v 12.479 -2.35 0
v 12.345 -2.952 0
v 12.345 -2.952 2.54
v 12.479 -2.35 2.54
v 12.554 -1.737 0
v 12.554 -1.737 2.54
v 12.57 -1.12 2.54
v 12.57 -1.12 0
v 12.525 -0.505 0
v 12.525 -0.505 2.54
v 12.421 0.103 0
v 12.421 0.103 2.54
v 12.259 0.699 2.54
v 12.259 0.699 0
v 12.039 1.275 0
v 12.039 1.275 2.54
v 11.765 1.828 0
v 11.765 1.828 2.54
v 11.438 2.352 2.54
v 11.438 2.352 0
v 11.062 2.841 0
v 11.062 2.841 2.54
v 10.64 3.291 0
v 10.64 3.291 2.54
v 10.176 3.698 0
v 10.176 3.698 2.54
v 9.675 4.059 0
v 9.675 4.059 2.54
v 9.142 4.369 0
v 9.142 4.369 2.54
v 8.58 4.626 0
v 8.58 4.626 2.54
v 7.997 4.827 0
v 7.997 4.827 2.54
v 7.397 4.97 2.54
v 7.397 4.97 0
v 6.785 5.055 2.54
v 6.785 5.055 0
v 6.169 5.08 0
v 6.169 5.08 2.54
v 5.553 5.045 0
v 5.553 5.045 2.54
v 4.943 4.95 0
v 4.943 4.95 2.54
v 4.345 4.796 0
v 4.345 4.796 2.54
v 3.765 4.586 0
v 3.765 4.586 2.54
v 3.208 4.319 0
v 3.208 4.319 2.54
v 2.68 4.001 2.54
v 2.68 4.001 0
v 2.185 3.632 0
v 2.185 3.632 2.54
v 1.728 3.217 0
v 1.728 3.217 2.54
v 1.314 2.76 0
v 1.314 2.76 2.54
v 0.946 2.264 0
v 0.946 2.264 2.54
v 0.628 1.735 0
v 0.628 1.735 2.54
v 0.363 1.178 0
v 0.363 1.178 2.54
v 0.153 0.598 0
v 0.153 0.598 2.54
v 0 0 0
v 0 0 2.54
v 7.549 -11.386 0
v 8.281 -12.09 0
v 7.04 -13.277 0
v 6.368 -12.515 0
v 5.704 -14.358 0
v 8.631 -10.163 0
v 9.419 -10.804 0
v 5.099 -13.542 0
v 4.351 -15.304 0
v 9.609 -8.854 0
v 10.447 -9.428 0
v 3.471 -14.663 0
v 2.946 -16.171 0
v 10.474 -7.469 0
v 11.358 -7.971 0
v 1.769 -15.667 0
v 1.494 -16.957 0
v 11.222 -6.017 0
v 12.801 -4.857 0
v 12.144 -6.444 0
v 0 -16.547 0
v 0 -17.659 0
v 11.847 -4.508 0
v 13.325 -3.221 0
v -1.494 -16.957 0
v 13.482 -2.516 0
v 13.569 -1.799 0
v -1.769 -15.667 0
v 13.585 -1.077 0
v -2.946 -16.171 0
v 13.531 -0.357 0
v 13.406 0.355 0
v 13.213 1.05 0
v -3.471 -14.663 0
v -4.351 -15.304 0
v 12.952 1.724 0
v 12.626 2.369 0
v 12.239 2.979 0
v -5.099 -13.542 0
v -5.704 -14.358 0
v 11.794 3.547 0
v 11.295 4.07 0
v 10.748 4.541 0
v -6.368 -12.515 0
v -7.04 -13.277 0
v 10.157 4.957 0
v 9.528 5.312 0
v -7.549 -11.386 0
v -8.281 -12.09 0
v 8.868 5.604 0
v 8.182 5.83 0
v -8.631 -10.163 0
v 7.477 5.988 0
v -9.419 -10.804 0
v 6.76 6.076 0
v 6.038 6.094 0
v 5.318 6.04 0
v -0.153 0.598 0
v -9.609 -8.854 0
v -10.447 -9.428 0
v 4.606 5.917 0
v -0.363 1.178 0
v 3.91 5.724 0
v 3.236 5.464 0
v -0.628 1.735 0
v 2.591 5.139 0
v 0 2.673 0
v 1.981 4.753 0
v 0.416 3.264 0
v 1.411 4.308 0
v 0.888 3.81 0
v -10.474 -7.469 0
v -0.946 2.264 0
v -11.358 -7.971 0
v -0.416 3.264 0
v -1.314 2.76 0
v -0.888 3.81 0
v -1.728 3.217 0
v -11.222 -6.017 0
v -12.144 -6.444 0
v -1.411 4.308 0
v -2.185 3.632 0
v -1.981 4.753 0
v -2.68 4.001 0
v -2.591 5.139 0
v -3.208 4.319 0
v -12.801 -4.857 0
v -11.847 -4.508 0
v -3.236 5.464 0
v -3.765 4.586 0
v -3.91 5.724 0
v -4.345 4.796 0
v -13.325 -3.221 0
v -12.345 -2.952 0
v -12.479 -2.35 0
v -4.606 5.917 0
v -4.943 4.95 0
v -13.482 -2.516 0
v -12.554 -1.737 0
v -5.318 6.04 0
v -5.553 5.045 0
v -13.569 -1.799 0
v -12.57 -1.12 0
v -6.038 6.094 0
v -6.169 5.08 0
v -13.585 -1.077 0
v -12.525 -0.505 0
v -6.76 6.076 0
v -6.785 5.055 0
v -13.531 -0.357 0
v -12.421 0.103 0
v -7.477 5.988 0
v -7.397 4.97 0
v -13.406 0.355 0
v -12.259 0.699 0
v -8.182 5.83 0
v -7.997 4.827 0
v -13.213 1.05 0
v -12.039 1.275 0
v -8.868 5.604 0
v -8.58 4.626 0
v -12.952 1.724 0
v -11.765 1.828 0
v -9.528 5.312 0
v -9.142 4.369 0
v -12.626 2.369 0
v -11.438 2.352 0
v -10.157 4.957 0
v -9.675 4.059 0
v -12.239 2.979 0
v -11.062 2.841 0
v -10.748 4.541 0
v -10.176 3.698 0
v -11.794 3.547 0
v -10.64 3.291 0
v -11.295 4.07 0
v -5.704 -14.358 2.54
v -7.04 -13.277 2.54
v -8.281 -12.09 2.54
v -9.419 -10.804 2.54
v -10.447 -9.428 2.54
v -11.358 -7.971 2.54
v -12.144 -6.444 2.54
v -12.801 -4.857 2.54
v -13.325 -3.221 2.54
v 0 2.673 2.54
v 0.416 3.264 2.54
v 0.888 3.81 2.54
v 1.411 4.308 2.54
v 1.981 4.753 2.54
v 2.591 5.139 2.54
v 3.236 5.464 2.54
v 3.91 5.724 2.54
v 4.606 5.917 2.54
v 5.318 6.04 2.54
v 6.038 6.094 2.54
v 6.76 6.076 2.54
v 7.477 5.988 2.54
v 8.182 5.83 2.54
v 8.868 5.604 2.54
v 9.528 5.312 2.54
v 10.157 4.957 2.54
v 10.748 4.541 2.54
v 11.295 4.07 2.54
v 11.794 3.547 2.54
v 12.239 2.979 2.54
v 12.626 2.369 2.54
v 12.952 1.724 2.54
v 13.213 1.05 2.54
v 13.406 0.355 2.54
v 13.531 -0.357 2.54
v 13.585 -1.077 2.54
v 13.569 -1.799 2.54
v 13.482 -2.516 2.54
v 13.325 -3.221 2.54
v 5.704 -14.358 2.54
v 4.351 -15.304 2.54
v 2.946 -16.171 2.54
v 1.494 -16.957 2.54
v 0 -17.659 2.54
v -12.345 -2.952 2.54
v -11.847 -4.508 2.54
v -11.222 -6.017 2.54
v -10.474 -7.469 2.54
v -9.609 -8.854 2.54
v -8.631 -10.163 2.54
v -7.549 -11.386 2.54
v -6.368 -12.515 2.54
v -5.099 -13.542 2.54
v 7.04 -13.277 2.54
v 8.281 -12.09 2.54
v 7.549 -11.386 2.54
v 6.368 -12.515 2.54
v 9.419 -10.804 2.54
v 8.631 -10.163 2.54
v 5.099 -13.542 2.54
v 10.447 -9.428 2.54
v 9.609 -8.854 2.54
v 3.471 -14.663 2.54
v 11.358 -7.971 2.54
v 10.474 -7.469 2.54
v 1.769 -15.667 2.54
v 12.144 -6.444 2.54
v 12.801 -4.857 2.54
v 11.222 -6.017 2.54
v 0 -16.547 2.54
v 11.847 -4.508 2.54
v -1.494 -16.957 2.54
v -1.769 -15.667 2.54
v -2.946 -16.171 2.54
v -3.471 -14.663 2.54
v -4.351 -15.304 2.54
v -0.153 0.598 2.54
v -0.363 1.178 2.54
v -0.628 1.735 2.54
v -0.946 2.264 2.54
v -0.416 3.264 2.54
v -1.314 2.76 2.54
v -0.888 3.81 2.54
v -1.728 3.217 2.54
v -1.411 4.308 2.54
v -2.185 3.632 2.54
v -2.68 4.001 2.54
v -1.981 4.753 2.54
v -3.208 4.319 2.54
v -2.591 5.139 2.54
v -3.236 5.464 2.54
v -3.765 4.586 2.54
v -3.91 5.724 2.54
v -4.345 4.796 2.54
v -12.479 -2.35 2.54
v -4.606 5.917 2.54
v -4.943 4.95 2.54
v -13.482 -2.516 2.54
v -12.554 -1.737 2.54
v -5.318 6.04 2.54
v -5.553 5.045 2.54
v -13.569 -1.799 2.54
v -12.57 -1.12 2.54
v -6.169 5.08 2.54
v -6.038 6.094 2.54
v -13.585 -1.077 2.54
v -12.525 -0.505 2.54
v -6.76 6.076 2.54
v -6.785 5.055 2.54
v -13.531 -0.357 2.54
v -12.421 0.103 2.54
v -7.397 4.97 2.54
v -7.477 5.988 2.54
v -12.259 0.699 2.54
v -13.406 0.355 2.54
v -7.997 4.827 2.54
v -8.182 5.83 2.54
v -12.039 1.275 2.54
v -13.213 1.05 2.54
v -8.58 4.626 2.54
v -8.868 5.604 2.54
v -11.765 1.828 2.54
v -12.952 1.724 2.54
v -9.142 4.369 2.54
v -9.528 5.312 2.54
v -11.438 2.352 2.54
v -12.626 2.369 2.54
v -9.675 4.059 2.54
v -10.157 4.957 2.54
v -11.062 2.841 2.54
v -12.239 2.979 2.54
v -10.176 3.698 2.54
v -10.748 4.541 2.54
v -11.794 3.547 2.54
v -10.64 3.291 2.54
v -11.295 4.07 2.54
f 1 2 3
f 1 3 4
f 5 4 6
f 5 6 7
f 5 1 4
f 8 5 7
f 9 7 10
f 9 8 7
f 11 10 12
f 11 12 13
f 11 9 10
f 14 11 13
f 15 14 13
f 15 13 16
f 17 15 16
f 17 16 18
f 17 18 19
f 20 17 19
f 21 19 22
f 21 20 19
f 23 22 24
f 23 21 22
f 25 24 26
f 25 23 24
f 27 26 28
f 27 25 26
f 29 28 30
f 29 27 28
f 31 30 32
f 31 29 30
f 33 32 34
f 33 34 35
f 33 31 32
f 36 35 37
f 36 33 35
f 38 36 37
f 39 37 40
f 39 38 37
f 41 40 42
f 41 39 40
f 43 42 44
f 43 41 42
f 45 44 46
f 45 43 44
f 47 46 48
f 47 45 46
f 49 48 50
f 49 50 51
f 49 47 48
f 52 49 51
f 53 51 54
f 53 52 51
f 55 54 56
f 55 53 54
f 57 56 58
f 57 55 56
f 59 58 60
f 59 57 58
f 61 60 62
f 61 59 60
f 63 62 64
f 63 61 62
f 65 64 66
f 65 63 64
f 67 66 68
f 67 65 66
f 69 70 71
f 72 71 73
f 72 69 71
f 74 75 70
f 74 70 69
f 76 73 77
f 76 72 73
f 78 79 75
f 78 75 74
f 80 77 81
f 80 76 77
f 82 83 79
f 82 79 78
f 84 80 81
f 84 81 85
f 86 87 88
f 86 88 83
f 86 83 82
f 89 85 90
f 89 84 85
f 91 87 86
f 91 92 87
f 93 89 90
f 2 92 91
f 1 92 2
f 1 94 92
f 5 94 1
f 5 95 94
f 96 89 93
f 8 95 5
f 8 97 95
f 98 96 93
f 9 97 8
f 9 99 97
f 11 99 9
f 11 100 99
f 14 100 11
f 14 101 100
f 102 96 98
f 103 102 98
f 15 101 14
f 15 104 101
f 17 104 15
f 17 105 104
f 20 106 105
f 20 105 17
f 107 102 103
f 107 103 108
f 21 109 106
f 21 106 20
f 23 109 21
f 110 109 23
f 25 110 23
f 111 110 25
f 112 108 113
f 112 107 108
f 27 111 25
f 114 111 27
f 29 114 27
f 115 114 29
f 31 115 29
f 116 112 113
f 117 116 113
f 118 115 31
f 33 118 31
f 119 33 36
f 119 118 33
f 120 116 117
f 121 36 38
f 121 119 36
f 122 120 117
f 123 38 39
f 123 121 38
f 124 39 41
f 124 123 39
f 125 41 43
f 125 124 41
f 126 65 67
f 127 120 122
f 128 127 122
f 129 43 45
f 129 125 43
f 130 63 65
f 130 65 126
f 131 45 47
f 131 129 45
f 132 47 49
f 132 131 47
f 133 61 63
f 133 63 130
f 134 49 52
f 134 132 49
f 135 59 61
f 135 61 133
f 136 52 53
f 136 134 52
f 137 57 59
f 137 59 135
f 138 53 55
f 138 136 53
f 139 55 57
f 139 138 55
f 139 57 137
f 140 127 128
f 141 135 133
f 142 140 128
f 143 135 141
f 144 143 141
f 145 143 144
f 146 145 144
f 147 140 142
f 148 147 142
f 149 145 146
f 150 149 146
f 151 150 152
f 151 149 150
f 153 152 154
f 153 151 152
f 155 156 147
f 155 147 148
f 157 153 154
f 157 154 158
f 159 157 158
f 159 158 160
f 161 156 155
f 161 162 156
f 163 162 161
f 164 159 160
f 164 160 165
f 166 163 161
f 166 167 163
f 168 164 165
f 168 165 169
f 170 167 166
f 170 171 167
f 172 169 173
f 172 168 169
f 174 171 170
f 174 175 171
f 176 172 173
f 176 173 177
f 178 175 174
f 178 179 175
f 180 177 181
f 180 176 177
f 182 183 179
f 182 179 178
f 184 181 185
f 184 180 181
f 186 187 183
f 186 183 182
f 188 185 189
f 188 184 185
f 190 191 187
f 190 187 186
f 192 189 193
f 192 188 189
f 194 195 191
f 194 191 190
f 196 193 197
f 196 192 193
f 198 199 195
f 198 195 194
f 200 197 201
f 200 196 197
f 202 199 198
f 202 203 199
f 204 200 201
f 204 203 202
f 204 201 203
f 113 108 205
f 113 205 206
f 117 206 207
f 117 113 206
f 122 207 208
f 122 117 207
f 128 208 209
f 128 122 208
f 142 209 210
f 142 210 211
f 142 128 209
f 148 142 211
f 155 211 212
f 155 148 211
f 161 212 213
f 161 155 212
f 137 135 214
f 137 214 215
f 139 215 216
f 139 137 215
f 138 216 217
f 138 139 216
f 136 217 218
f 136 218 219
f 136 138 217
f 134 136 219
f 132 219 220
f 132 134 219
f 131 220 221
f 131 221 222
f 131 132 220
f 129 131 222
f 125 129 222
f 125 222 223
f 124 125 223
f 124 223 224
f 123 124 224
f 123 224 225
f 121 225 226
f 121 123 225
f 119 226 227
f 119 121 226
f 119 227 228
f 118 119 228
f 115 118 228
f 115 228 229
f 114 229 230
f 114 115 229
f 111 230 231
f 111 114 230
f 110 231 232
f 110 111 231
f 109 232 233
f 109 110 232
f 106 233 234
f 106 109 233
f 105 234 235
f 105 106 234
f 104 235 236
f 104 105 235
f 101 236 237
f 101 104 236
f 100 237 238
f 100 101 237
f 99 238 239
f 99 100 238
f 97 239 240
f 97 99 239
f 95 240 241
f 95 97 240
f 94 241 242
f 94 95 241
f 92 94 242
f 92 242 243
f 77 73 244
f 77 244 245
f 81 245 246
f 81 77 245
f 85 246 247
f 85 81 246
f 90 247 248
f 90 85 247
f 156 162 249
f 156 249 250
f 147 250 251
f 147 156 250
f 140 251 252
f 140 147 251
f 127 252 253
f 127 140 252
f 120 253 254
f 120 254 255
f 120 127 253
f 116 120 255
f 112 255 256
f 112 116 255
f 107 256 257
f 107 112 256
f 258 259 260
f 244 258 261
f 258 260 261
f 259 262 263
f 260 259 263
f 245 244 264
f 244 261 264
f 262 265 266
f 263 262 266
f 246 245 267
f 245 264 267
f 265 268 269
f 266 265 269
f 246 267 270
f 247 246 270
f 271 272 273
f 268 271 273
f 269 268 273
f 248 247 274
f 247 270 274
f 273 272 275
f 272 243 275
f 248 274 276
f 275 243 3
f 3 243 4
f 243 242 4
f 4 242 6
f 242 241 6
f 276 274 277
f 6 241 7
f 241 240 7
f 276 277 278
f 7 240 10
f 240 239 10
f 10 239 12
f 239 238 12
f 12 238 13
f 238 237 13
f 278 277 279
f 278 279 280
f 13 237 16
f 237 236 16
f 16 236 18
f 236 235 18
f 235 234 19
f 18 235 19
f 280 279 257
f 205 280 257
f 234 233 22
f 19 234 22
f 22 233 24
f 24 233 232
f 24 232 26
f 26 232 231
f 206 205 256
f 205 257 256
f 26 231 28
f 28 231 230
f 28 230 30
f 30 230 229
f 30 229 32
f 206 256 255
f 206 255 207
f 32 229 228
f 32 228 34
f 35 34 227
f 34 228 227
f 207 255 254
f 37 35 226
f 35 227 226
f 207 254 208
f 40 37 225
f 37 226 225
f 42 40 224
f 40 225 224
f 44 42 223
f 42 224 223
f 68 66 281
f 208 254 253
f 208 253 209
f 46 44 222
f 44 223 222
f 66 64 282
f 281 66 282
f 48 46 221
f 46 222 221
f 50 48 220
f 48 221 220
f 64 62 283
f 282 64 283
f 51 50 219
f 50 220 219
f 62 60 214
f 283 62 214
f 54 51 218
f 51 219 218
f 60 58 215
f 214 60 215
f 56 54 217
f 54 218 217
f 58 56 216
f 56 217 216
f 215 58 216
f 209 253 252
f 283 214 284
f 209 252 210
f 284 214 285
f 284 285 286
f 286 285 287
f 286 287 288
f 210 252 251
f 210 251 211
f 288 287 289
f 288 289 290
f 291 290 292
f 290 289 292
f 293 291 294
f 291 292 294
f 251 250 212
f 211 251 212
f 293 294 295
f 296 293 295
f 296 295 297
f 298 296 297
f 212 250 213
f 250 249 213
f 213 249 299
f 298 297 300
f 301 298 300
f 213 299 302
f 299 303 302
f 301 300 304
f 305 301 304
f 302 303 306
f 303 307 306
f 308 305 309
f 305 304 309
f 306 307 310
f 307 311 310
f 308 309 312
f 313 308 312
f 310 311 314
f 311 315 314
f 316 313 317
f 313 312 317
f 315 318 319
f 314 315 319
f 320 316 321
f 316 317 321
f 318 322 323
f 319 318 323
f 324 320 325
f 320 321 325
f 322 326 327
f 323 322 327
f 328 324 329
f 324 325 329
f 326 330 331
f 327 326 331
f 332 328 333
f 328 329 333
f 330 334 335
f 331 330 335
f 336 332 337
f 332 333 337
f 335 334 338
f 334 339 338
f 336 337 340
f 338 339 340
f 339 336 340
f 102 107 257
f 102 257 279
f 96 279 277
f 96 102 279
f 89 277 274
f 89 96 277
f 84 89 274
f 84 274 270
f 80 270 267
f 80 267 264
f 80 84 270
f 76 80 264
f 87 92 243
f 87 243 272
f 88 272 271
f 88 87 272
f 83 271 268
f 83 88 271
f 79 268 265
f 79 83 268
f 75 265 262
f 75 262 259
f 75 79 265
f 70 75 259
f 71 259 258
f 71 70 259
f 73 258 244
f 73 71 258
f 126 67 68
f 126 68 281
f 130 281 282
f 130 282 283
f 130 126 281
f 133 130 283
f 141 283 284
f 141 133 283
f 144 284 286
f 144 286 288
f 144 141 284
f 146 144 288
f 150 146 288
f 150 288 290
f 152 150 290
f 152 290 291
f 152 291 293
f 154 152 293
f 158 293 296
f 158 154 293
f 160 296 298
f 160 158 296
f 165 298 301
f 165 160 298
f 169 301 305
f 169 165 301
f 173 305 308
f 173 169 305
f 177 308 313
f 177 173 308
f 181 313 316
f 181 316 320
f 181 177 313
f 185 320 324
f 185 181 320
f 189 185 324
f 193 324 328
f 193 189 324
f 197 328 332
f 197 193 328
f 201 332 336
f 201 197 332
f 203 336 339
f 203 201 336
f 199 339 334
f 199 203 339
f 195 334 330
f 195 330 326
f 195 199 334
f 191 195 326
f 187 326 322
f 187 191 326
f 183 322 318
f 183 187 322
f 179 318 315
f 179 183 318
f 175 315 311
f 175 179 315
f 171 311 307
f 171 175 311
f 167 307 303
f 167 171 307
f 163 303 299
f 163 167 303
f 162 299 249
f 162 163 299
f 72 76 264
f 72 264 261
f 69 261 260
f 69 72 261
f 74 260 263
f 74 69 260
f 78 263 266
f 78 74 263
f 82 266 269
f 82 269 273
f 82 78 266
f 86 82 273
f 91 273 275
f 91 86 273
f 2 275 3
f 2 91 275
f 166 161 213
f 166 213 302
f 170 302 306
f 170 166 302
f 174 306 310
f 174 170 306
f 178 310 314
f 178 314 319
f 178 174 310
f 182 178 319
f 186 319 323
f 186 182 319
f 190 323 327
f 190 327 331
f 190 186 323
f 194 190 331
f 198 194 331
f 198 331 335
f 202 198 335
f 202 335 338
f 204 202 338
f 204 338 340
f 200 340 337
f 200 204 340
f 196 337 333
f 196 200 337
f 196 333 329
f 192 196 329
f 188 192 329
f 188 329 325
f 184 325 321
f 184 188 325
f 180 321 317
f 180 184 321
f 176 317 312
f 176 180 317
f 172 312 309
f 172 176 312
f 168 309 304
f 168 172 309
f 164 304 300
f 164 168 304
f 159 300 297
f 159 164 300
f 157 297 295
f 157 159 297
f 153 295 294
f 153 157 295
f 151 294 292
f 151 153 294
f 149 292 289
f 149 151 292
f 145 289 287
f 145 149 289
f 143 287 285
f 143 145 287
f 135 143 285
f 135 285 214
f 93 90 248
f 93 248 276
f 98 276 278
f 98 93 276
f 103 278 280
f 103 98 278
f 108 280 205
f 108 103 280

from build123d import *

# Parameters (mm, degrees)
BOSS_EXTRUDE1_DEPTH = 2.54


with BuildPart() as part:
    # Sketch1 → Boss-Extrude1 (new body)
    with BuildSketch(Plane.XY):
        with BuildLine():
            ThreePointArc((-13.324567367, -3.22122711), (-9.201637253, 5.466316018), (0, 2.673140373))
            ThreePointArc((0, 2.673140373), (9.201637253, 5.466316018), (13.324567367, -3.22122711))
            ThreePointArc((13.324567367, -3.22122711), (10.447333261, -9.42774786), (5.704348435, -14.357602914))
            ThreePointArc((5.704348435, -14.357602914), (2.946415451, -16.171190718), (0, -17.659119163))
            ThreePointArc((0, -17.659119163), (-2.946415451, -16.171190718), (-5.704348435, -14.357602914))
            ThreePointArc((-5.704348435, -14.357602914), (-10.447333261, -9.42774786), (-13.324567367, -3.22122711))
        make_face()
        with BuildLine():
            ThreePointArc((12.344862067, -2.952092336), (7.698572292, 4.905869161), (0, 0))
            ThreePointArc((0, 0), (-7.698572292, 4.905869161), (-12.344862067, -2.952092336))
            ThreePointArc((-12.344862067, -2.952092336), (-9.608841906, -8.853998571), (-5.098641611, -13.541897549))
            ThreePointArc((-5.098641611, -13.541897549), (-2.629119582, -15.179915612), (0, -16.547165572))
            ThreePointArc((0, -16.547165572), (2.629119582, -15.179915612), (5.098641611, -13.541897549))
            ThreePointArc((5.098641611, -13.541897549), (9.608841906, -8.853998571), (12.344862067, -2.952092336))
        make_face(mode=Mode.SUBTRACT)
    extrude(amount=BOSS_EXTRUDE1_DEPTH)


solid = part.part
